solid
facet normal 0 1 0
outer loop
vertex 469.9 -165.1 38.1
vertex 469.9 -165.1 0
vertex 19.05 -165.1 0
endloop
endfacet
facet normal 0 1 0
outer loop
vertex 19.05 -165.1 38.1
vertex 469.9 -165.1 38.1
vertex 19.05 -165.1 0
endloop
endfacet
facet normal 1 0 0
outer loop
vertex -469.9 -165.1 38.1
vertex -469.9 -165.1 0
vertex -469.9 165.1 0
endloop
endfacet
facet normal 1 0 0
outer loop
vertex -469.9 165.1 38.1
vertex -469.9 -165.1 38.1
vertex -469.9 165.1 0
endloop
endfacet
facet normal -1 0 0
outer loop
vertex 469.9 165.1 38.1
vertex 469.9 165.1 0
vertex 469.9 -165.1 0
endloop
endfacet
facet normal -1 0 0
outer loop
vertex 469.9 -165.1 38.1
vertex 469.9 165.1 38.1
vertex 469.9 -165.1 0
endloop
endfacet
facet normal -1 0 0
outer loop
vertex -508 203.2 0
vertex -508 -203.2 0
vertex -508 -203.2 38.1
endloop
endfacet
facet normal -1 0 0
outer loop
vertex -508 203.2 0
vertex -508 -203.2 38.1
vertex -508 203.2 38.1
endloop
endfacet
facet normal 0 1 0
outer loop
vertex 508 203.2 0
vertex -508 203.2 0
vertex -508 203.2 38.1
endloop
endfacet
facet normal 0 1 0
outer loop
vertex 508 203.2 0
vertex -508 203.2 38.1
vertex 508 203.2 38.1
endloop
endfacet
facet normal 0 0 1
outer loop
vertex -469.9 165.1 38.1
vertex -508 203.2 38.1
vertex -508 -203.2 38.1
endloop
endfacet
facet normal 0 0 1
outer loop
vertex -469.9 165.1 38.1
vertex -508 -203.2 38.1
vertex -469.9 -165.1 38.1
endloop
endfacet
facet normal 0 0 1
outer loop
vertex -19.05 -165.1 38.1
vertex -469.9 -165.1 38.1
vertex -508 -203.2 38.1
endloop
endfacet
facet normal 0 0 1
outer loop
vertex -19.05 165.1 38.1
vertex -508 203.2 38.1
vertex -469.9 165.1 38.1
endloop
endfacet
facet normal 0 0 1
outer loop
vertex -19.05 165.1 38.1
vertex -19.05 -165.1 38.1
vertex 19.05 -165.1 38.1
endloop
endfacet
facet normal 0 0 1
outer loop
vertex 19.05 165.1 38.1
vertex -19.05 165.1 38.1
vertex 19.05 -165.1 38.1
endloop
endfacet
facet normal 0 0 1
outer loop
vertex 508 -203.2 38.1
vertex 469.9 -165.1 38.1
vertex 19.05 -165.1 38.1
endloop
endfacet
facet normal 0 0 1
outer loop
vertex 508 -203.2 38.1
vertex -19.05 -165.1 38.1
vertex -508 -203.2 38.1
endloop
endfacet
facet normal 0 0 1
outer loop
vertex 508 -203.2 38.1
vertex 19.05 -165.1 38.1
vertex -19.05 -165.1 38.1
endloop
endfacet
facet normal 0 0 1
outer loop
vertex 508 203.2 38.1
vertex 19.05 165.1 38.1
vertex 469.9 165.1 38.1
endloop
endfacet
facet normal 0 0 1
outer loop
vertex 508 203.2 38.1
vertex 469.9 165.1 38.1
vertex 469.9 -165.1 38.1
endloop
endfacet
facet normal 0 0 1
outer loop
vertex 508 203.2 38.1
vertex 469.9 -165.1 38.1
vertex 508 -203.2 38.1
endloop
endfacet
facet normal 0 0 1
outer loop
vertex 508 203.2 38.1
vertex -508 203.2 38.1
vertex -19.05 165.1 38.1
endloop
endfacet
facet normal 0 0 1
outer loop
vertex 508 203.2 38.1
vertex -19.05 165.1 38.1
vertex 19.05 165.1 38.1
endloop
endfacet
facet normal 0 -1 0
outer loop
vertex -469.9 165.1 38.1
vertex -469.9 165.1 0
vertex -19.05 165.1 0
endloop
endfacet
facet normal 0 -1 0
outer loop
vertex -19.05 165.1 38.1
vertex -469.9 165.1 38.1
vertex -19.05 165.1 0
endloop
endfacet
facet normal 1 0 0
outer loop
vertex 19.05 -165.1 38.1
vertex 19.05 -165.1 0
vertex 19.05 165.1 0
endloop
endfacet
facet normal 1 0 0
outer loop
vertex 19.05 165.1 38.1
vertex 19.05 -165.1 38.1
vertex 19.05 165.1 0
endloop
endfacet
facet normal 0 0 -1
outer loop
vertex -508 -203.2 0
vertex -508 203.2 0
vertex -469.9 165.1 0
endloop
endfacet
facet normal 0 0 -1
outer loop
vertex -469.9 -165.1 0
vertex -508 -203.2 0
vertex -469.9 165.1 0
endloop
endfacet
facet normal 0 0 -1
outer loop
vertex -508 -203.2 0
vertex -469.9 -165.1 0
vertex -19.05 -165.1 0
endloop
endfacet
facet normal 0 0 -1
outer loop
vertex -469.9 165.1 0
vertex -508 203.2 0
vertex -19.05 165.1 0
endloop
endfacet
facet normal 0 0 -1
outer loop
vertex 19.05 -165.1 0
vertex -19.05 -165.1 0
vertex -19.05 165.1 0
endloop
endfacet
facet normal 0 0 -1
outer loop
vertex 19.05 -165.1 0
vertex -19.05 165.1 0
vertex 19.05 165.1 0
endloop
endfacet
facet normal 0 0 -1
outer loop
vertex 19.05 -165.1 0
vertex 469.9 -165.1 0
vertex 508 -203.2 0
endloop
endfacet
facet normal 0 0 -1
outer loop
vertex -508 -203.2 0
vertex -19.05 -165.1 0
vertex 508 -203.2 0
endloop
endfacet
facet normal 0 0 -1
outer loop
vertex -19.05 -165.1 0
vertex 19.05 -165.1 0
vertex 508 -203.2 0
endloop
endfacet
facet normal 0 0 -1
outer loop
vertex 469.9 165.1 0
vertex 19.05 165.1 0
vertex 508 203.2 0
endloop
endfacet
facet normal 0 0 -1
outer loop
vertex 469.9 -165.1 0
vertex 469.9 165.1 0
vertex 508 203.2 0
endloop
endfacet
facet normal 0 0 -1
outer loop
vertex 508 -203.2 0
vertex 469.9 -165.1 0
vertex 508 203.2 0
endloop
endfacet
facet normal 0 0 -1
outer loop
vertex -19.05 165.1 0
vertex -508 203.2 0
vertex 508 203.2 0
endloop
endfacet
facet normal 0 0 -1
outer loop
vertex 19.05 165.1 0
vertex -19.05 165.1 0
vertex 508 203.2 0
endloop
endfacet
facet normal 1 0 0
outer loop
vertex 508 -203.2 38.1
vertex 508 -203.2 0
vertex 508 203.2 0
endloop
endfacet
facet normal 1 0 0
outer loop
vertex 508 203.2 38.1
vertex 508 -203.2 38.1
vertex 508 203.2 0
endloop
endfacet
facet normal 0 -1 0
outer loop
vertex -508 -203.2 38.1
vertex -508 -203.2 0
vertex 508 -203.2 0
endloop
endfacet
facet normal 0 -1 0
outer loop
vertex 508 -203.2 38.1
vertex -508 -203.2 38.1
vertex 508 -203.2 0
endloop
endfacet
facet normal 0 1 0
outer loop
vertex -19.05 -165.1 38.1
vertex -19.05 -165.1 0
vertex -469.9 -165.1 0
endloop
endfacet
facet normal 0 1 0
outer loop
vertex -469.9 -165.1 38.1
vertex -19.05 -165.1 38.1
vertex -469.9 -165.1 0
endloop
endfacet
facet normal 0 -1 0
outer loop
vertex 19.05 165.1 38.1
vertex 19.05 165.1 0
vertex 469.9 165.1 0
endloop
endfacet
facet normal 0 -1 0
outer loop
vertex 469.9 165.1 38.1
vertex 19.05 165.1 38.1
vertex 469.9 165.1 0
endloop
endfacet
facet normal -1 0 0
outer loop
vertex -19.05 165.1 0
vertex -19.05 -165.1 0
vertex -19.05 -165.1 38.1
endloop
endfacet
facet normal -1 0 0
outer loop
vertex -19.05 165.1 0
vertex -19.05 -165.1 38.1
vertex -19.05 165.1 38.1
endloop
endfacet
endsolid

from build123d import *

# Parameters (mm, degrees)
F0_W     = 1016
F0_H     = 406.4
F0_W_2   = 38.1
F0_H_2   = 330.2
F1_DEPTH = 38.1


with BuildPart() as f1:
    # F0 (on Top) → F1 (new body)
    with BuildSketch(Plane.XY):
        Rectangle(F0_W, F0_H)
        Polygon((469.9, 165.1), (469.9, -165.1), (19.05, -165.1), (-19.05, -165.1), (-469.9, -165.1), (-469.9, 165.1), (-19.05, 165.1), (19.05, 165.1), align=None, mode=Mode.SUBTRACT)
        Rectangle(F0_W_2, F0_H_2)
    extrude(amount=F1_DEPTH)


solid = f1.part
